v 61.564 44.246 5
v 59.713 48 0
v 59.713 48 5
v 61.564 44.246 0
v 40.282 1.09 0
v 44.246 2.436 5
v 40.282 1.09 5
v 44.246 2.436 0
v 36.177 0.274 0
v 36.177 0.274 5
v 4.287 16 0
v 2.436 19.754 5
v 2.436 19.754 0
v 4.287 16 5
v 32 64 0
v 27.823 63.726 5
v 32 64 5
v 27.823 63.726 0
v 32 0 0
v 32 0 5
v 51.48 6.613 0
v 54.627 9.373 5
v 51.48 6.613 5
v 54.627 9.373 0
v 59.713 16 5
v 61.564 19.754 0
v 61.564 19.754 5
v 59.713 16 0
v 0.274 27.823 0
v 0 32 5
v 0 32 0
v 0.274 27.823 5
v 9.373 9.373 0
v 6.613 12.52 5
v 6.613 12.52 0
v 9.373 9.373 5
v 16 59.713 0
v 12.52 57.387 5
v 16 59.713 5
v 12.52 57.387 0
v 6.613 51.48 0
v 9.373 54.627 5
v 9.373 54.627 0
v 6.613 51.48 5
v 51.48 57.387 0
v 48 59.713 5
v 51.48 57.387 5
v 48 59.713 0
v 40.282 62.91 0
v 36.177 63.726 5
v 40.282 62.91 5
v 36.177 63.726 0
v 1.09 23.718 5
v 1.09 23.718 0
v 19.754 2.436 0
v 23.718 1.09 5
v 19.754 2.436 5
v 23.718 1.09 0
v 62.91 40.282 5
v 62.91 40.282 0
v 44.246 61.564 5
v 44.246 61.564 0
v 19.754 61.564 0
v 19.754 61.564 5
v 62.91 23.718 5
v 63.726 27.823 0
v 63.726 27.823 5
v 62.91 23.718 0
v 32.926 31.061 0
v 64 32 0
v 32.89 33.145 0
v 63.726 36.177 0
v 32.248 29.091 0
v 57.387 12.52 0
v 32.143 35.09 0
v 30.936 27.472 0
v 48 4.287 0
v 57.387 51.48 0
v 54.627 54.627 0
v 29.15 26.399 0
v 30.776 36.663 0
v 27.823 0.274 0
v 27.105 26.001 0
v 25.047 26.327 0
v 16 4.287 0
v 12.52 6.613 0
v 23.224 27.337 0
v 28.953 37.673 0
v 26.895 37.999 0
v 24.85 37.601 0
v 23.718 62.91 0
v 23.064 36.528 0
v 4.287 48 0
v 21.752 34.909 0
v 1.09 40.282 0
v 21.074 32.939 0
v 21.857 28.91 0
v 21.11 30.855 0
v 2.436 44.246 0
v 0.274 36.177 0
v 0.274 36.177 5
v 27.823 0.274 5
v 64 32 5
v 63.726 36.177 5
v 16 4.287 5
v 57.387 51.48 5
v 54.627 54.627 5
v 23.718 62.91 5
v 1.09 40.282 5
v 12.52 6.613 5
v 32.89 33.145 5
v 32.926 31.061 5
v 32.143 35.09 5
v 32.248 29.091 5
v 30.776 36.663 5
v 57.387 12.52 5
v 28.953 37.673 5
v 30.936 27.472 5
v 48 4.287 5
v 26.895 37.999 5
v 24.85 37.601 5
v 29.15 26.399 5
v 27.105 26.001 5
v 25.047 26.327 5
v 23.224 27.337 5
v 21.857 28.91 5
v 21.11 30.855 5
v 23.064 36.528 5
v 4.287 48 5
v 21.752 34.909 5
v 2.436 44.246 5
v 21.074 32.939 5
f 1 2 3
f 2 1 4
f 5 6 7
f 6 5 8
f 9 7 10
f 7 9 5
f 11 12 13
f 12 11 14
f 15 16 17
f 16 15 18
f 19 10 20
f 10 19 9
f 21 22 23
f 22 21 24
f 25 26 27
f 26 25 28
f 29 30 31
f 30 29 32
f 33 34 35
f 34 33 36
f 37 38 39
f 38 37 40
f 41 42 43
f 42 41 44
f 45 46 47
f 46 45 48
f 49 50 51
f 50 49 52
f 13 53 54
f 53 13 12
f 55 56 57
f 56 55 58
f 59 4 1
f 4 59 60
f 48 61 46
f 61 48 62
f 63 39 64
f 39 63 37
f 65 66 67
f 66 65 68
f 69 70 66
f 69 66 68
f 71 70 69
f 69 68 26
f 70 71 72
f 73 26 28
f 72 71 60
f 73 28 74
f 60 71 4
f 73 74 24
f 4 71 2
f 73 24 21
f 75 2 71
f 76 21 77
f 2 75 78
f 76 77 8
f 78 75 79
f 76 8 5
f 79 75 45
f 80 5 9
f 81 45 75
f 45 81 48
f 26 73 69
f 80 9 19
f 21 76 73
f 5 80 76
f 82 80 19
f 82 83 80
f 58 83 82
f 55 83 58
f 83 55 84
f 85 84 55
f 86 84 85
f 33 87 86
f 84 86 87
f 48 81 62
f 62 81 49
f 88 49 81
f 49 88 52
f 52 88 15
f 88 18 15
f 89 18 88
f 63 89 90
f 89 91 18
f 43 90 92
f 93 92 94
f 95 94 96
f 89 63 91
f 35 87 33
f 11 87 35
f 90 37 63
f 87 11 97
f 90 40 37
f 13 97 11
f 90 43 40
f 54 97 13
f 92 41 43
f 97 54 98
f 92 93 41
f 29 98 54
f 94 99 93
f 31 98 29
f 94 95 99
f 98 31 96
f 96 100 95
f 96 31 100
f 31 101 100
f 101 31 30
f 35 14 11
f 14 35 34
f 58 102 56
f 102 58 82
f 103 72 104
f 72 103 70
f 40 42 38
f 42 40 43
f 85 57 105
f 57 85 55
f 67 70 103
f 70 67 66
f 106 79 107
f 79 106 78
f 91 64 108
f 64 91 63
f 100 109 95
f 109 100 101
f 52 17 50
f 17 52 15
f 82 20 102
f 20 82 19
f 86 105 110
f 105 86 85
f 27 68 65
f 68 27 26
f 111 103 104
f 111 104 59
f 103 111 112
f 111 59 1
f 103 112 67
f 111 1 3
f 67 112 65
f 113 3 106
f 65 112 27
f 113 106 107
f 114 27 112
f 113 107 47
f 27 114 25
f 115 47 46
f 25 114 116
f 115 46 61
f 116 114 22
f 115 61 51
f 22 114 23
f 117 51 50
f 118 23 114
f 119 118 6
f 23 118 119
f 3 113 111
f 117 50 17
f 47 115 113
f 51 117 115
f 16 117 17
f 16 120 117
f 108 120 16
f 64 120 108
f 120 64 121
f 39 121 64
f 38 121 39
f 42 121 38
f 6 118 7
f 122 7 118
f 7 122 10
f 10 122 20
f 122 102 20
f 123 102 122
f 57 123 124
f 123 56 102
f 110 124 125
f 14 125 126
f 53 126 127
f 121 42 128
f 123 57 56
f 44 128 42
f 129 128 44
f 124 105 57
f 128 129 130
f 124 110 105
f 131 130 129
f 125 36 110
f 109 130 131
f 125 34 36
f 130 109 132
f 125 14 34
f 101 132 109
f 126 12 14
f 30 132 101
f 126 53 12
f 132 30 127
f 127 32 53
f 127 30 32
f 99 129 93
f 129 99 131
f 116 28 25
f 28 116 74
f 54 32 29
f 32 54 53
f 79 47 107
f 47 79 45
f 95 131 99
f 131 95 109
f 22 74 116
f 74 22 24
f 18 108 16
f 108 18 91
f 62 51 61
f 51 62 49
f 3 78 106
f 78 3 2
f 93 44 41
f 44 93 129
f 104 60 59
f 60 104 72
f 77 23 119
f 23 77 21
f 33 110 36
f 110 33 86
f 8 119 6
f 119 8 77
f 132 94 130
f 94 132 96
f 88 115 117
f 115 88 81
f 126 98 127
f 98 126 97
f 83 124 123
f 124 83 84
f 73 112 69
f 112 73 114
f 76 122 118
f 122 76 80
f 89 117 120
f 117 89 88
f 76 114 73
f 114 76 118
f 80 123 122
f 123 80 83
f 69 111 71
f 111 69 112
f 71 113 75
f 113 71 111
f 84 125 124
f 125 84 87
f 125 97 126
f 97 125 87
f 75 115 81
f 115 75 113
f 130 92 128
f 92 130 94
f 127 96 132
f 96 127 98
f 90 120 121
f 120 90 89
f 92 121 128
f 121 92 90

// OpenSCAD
$fn = 32;

// ----------------------------------------------------------------------
// Cam plate: eccentric cam, base R32
// ----------------------------------------------------------------------

// --- parameters (mm) ---
base_r = 32;              // base circle radius
lobe_h = 10;              // cam lobe rise
bore_r = 6;               // shaft bore radius
plate_t = 5;              // plate thickness, Z (extrusion height)
ecc = 5;                  // disc eccentricity
fit_tol = 0.1;            // declared fit tolerance (prompt contract)
free_tol = 0.3;           // declared free tolerance (prompt contract)

profile = [[64, 32], [63.726, 36.177], [62.91, 40.282], [61.564, 44.246], [59.713, 48], [57.387, 51.48], [54.627, 54.627], [51.48, 57.387], [48, 59.713], [44.246, 61.564], [40.282, 62.91], [36.177, 63.726], [32, 64], [27.823, 63.726], [23.718, 62.91], [19.754, 61.564], [16, 59.713], [12.52, 57.387], [9.373, 54.627], [6.613, 51.48], [4.287, 48], [2.436, 44.246], [1.09, 40.282], [0.274, 36.177], [0, 32], [0.274, 27.823], [1.09, 23.718], [2.436, 19.754], [4.287, 16], [6.613, 12.52], [9.373, 9.373], [12.52, 6.613], [16, 4.287], [19.754, 2.436], [23.718, 1.09], [27.823, 0.274], [32, 0], [36.177, 0.274], [40.282, 1.09], [44.246, 2.436], [48, 4.287], [51.48, 6.613], [54.627, 9.373], [57.387, 12.52], [59.713, 16], [61.564, 19.754], [62.91, 23.718], [63.726, 27.823]];  // primary outline, 48 points, counter clockwise
void_1 = [[32.89, 33.145], [32.143, 35.09], [30.776, 36.663], [28.953, 37.673], [26.895, 37.999], [24.85, 37.601], [23.064, 36.528], [21.752, 34.909], [21.074, 32.939], [21.11, 30.855], [21.857, 28.91], [23.224, 27.337], [25.047, 26.327], [27.105, 26.001], [29.15, 26.399], [30.936, 27.472], [32.248, 29.091], [32.926, 31.061]];  // shaft bore, 18 points

// --- the one profile operation ---
difference() {
  linear_extrude(height = plate_t) polygon(points = profile);
  translate([0, 0, -1])
    linear_extrude(height = plate_t + 2) polygon(points = void_1);
}
